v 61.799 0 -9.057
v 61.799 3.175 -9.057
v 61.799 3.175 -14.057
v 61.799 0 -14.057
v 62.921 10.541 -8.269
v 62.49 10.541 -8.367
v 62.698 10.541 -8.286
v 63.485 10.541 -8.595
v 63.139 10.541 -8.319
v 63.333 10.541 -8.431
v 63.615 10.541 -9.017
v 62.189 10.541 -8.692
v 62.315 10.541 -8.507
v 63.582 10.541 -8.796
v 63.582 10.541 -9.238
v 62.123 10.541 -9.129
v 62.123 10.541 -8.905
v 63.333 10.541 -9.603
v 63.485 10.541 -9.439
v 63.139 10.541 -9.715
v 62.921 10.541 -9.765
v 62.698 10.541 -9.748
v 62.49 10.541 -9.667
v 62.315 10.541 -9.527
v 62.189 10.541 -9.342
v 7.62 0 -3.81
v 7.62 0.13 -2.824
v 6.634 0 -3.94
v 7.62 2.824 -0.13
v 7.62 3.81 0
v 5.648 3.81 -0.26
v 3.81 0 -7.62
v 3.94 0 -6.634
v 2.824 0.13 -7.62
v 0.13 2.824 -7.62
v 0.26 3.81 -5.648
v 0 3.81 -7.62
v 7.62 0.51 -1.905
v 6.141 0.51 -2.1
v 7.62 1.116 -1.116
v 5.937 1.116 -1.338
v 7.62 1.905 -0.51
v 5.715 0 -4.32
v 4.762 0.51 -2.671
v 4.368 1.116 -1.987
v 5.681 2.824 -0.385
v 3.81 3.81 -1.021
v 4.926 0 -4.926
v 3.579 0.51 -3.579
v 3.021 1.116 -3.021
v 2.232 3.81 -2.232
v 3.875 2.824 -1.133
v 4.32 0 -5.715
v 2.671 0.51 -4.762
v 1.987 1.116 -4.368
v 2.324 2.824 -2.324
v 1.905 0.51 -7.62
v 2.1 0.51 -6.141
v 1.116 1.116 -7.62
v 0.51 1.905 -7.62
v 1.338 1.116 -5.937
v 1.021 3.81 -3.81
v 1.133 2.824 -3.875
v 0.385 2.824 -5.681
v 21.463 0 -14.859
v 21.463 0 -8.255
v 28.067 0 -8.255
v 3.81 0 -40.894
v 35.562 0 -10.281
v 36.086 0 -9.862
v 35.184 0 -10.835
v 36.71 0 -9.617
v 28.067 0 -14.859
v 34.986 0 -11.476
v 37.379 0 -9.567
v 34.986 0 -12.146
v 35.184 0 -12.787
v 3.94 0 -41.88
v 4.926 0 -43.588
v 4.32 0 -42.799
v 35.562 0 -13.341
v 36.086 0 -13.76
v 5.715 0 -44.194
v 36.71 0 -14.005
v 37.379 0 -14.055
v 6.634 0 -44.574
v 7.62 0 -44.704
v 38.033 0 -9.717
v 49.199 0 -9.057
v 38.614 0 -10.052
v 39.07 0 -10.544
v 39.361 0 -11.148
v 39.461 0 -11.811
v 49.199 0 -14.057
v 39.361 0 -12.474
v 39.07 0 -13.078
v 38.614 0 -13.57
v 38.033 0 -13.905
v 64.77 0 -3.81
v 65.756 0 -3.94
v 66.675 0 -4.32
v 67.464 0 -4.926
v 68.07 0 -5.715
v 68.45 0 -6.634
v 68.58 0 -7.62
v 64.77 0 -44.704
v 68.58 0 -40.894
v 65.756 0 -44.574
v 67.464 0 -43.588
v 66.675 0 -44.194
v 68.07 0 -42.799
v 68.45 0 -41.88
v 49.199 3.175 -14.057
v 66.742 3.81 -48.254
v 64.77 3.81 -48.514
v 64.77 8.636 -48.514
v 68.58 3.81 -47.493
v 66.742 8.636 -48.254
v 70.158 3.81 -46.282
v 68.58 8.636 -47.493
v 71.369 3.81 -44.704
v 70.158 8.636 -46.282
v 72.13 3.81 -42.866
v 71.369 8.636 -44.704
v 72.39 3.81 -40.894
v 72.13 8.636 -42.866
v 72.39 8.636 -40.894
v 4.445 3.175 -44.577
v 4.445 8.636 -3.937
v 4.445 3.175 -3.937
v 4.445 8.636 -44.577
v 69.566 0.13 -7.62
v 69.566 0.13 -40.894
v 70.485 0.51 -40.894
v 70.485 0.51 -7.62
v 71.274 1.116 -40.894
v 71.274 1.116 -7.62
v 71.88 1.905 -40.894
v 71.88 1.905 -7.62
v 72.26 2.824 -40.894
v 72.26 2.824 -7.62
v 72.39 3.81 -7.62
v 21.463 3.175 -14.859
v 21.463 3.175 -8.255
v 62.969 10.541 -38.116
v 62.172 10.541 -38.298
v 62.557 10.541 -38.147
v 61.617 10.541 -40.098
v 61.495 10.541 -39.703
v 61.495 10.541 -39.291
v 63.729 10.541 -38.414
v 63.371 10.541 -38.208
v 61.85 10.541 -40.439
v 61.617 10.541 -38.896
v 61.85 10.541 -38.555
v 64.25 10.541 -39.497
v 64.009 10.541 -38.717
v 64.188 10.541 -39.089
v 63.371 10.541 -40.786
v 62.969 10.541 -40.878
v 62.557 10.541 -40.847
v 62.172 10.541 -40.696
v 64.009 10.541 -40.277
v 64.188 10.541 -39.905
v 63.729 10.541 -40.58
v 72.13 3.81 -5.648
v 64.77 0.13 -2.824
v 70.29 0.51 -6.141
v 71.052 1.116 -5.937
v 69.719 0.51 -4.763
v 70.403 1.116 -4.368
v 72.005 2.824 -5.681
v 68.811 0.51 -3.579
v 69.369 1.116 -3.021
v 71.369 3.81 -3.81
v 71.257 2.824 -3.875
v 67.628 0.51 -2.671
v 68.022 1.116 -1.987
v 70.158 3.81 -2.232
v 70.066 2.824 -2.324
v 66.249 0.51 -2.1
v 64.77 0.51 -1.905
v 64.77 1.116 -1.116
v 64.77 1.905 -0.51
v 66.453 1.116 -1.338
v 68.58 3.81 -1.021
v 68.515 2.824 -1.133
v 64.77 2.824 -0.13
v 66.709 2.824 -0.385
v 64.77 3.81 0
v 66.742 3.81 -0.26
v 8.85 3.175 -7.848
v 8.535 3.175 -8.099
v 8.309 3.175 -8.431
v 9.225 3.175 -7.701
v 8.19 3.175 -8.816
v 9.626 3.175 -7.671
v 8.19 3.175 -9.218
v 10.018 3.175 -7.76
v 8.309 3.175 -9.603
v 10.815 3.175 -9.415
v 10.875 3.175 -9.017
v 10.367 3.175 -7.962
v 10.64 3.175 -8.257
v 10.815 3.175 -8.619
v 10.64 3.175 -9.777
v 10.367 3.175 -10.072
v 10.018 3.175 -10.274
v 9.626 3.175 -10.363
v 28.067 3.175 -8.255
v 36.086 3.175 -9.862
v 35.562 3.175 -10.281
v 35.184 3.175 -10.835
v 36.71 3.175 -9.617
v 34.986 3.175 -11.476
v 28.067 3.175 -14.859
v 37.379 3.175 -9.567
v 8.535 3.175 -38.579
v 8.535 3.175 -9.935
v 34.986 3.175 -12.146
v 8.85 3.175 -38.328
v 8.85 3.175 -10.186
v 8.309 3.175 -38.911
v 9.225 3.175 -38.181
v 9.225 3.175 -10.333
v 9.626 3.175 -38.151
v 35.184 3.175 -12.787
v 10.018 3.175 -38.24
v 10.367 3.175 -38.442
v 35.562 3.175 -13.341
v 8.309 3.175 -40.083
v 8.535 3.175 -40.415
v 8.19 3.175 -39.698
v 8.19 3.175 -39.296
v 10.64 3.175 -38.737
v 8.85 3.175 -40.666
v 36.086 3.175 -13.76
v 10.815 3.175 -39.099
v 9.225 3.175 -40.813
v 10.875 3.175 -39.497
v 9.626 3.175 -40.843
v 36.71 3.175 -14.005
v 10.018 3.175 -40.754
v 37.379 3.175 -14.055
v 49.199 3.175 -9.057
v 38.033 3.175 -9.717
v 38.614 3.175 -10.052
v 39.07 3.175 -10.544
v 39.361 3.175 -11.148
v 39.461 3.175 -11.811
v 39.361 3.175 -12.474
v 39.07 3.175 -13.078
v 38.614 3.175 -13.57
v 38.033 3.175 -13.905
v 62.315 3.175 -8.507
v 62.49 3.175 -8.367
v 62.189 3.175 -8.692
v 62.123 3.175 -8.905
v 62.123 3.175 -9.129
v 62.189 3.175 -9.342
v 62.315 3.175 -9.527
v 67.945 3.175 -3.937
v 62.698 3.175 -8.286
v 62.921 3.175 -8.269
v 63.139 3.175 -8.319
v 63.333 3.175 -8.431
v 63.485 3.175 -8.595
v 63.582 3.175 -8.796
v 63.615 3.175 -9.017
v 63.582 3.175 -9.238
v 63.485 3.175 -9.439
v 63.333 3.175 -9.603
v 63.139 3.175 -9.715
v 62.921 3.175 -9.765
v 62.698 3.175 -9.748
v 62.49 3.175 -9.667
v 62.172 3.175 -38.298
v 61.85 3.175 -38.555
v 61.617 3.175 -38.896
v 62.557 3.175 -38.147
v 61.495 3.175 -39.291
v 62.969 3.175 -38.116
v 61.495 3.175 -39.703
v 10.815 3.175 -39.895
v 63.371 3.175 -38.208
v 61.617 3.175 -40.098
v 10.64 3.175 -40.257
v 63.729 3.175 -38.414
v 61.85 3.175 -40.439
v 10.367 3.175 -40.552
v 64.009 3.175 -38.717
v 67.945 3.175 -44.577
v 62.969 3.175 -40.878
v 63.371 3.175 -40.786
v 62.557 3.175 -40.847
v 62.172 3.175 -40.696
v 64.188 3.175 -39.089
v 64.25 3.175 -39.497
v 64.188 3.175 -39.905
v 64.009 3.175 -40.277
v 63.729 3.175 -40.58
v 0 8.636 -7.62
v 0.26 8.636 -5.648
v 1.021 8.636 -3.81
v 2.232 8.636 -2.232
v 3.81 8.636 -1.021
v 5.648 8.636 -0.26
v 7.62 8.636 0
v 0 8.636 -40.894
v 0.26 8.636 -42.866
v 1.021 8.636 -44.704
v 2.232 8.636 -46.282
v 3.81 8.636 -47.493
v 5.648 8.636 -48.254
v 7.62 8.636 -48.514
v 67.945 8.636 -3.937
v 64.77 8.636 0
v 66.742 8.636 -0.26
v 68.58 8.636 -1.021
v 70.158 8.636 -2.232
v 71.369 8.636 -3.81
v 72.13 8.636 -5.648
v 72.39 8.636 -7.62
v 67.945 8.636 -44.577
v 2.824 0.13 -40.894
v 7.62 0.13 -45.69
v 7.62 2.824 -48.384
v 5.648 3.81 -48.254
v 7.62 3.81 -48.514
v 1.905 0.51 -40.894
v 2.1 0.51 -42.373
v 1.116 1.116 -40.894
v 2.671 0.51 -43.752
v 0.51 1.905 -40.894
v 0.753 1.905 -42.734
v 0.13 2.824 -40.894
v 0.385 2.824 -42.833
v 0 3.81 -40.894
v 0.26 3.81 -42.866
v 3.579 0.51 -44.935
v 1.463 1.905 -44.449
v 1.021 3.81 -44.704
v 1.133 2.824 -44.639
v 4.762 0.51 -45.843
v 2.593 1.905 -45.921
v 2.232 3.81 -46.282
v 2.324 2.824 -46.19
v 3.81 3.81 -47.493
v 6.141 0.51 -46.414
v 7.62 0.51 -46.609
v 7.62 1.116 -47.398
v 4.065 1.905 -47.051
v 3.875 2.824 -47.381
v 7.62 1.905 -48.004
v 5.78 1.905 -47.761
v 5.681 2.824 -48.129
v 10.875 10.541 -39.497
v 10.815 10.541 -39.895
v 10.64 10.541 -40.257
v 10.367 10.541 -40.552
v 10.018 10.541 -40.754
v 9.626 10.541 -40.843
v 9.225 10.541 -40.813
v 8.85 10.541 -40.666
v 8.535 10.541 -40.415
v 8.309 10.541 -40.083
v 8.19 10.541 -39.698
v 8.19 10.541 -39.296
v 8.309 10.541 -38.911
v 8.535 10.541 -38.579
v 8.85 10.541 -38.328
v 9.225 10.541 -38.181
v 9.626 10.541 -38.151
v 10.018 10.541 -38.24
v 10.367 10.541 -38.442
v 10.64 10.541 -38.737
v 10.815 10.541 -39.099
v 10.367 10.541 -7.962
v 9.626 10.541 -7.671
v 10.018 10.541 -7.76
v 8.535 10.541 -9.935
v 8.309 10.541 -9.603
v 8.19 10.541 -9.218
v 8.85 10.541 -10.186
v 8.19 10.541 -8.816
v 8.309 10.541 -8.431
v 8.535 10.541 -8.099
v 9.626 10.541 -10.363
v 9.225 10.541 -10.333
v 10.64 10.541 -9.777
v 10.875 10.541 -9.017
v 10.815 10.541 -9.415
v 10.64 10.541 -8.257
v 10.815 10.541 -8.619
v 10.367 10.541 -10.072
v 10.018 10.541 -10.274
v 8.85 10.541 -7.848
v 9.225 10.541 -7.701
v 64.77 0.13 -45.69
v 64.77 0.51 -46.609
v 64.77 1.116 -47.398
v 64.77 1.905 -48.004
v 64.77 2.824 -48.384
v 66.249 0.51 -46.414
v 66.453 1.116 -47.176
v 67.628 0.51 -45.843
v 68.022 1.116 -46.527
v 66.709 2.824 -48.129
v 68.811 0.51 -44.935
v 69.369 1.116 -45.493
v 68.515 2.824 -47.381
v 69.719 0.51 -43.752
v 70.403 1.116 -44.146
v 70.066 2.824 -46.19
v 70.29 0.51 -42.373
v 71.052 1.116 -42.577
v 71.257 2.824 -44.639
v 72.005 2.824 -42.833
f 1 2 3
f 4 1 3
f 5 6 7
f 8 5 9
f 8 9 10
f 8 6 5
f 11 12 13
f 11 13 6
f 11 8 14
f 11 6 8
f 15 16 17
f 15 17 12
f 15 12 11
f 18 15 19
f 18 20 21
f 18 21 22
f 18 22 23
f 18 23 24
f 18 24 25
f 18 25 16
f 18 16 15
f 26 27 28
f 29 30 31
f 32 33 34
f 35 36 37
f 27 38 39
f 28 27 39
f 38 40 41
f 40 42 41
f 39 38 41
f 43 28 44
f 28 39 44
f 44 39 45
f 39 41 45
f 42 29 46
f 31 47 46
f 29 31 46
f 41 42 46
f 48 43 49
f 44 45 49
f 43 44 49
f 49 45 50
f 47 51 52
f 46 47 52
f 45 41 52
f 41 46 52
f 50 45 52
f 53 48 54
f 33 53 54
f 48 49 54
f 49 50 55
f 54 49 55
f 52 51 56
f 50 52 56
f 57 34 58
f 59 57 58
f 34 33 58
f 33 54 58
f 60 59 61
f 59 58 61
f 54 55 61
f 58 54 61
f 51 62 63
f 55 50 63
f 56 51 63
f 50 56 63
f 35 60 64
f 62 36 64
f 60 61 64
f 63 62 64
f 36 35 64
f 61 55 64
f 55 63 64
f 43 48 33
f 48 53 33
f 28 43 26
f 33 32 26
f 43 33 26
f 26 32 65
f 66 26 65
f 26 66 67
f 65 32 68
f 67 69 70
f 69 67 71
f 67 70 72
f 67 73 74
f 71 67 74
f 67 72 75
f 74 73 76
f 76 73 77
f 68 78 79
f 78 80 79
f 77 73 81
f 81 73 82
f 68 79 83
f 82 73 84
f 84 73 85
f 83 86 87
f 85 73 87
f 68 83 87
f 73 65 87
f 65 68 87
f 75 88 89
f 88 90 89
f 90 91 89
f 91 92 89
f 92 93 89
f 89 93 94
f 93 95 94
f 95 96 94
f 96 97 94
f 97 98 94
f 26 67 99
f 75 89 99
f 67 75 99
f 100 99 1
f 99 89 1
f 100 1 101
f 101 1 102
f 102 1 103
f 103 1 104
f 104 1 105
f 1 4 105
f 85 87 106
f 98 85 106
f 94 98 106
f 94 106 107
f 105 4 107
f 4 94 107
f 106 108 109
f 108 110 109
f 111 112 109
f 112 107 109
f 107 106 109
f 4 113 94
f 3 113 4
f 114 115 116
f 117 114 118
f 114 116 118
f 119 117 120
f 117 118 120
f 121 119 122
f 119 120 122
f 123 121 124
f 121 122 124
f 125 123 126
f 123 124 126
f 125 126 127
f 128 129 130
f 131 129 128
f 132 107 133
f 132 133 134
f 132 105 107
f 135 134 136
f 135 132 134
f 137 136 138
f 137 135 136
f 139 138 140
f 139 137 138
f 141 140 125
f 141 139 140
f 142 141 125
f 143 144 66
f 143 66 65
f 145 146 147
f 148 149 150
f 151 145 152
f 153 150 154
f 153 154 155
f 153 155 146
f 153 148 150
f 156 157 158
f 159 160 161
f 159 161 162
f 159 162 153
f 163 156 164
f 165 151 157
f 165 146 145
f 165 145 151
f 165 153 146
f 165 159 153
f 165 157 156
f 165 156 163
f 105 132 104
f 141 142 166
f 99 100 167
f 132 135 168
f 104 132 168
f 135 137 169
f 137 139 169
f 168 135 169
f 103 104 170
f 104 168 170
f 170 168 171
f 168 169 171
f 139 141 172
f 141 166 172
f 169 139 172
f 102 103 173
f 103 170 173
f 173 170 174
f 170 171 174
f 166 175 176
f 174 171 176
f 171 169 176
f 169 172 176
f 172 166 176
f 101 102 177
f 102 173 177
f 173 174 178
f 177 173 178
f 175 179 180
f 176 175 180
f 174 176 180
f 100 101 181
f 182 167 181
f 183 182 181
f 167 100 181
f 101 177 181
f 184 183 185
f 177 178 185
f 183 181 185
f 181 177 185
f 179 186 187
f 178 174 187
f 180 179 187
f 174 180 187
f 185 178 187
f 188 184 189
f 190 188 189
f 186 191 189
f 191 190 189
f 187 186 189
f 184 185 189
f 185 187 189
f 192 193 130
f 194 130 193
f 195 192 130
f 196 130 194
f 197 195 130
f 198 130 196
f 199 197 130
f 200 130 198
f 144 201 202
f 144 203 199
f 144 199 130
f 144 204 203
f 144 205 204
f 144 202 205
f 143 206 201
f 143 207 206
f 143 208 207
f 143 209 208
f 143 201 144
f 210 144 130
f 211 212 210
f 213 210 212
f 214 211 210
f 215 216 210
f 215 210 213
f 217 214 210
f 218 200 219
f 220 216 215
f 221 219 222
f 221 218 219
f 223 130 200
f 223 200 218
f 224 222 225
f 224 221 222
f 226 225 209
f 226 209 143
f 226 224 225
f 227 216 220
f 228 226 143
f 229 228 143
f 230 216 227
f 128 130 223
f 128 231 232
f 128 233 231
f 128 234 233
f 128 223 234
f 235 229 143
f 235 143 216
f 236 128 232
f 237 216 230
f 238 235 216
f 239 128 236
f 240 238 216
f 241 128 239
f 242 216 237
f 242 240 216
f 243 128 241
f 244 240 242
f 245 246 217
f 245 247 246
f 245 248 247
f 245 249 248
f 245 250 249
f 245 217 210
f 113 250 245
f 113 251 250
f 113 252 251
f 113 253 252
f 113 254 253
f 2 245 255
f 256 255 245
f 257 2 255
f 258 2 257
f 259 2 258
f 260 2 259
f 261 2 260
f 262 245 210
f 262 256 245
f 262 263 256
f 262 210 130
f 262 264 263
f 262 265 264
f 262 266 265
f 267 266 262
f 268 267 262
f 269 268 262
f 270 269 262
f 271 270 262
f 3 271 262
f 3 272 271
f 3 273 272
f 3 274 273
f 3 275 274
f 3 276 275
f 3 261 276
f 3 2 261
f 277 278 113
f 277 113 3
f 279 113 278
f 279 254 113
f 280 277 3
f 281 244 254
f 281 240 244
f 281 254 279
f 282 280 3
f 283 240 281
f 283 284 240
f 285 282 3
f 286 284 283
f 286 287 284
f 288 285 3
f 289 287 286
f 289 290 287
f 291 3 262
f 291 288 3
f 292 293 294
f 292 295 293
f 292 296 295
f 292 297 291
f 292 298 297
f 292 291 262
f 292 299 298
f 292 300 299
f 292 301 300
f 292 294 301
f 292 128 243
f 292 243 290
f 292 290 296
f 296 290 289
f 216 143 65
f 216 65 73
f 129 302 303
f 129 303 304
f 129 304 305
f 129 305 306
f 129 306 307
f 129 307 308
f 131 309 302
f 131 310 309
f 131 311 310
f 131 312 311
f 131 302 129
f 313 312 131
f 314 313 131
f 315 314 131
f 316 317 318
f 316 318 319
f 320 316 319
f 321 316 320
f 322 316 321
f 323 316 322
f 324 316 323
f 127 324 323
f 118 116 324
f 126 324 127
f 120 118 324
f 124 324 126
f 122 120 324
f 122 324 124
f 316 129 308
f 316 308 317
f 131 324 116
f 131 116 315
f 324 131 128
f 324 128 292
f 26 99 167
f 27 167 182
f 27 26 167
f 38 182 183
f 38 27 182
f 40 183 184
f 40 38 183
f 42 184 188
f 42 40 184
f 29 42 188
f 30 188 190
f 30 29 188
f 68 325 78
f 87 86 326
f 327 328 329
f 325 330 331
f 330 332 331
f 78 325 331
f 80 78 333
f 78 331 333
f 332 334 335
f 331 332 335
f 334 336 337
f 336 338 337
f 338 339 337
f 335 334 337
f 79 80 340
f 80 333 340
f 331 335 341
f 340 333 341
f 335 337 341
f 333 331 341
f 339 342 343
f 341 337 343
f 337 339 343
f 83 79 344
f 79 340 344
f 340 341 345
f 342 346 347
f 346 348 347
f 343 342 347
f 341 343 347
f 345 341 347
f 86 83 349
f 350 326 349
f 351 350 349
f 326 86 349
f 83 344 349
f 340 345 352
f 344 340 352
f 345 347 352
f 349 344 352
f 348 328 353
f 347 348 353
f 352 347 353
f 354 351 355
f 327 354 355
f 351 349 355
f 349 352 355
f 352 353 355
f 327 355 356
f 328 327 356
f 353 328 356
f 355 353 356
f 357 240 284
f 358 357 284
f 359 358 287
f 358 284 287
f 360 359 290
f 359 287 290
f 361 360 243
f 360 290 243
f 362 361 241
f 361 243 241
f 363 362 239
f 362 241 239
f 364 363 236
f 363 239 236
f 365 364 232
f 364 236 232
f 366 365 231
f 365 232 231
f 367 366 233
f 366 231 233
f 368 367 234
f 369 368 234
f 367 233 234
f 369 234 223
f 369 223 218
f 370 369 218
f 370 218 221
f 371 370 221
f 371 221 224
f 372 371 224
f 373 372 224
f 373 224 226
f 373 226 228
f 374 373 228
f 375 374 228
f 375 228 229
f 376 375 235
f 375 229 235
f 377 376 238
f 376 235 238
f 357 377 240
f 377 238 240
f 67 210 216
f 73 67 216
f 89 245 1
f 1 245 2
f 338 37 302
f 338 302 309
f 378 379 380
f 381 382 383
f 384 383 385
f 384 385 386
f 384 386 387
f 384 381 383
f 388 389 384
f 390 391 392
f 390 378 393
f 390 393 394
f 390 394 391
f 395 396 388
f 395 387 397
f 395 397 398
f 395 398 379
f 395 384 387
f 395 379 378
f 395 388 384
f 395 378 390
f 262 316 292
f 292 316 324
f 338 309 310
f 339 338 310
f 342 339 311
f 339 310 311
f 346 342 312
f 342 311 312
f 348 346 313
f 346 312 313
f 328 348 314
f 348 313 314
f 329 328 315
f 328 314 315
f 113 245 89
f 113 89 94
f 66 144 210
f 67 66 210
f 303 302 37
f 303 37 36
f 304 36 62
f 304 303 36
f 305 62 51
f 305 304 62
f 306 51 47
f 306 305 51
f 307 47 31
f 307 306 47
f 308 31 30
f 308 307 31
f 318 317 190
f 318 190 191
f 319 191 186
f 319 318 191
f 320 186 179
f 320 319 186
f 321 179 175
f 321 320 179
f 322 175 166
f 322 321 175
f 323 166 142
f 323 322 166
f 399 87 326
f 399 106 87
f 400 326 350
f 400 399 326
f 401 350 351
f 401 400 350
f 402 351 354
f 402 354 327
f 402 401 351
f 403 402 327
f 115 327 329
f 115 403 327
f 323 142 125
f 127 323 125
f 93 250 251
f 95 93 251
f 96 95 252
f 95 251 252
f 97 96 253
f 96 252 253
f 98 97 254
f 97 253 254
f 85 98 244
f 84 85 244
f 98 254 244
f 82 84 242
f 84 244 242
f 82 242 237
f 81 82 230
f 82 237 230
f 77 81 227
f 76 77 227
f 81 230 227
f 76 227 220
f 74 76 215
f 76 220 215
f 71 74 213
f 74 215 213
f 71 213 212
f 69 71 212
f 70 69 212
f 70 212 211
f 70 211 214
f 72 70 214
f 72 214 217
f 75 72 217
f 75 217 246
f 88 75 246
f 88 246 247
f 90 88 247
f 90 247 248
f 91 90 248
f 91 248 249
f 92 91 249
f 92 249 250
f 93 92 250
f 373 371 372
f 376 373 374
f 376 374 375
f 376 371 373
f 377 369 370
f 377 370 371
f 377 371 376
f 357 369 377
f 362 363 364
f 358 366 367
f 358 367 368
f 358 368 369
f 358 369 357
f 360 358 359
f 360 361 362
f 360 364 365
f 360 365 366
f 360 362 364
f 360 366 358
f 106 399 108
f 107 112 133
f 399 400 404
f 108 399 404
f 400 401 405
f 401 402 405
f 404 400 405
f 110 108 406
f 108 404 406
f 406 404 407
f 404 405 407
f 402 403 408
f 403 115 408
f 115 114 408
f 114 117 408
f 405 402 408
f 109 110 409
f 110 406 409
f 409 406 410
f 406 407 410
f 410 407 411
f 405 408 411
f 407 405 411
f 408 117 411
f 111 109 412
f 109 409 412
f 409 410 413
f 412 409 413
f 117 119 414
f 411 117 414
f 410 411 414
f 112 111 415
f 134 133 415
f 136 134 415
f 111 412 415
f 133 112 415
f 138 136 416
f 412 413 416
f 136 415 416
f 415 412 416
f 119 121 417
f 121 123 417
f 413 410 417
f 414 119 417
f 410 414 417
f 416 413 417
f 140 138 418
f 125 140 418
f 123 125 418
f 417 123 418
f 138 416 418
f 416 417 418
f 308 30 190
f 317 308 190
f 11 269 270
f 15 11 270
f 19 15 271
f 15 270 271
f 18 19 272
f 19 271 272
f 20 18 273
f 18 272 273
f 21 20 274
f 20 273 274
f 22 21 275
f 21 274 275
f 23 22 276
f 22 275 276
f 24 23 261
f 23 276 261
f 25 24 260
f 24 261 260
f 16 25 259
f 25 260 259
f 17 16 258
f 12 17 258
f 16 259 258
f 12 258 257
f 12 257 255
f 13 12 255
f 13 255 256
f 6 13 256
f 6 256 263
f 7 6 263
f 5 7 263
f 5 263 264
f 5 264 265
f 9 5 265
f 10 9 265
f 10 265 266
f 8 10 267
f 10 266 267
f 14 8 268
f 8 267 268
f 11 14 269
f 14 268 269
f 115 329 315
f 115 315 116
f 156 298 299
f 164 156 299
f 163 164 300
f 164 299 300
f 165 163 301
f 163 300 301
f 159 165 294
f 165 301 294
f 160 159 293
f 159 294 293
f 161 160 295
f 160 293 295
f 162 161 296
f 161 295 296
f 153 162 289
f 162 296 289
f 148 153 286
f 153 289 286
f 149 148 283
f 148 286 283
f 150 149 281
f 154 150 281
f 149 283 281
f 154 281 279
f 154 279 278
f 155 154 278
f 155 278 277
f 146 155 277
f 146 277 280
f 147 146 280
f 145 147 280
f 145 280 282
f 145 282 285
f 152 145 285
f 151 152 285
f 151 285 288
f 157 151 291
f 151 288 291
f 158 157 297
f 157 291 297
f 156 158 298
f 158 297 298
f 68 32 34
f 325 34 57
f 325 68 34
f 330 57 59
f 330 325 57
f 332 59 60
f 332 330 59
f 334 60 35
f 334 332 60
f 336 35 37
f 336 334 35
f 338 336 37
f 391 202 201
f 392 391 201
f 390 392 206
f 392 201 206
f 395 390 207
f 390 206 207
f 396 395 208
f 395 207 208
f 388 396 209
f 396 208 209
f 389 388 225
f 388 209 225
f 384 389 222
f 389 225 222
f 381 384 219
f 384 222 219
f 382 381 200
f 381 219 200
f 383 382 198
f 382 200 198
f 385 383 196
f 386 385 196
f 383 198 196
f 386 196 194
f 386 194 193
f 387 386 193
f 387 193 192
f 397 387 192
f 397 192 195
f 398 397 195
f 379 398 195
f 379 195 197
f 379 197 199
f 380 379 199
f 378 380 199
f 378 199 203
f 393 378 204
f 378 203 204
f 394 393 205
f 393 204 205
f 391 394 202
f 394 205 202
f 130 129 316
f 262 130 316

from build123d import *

# Parameters (mm, degrees)
SKETCH1_W           = 72.39
SKETCH1_H           = 48.514
BOSS_EXTRUDE1_DEPTH = 8.636
SKETCH2_W           = 63.5
SKETCH2_H           = 40.64
CUT_EXTRUDE1_DEPTH  = 5.461
FILLET2_R           = 7.62
FILLET3_R           = 3.81
SKETCH4_R           = 2.25
SKETCH4_W           = 12.6
SKETCH4_H           = 5
SKETCH4_W_2         = 6.604
SKETCH4_H_2         = 6.604
CUT_EXTRUDE2_DEPTH  = 7.366
SKETCH5_R           = 1.35
SKETCH5_R_2         = 1.3499973
SKETCH5_R_3         = 1.385
SKETCH5_R_4         = 0.75
BOSS_EXTRUDE2_DEPTH = 7.366


with BuildPart() as part:
    # Sketch1 → Boss-Extrude1 (new body)
    with BuildSketch(Plane(origin=(0, 0, 0), x_dir=(1, 0, 0), z_dir=(0, 1, 0))):
        with Locations((36.195, 24.257)):
            Rectangle(SKETCH1_W, SKETCH1_H)
    extrude(amount=BOSS_EXTRUDE1_DEPTH)

    # Sketch2 → Cut-Extrude1 (cut)
    with BuildSketch(Plane(origin=(0, 8.636, 0), x_dir=(1, 0, 0), z_dir=(0, 1, 0))):
        with Locations((36.195, 24.257)):
            Rectangle(SKETCH2_W, SKETCH2_H)
    extrude(amount=-CUT_EXTRUDE1_DEPTH, mode=Mode.SUBTRACT)

    # Fillet2
    fillet2_edges = [part.edges().sort_by_distance(p)[0] for p in [
        (0, 4.318, -48.514),
        (72.39, 4.318, -48.514),
        (72.39, 4.318, 0),
        (0, 4.318, 0),
    ]]
    fillet(fillet2_edges, radius=FILLET2_R)

    # Fillet3
    fillet3_edges = [part.edges().sort_by_distance(p)[0] for p in [
        (36.195, 0, -48.514),
        (0, 0, -24.257),
        (72.39, 0, -24.257),
        (36.195, 0, 0),
        (2.231846327, 0, -46.282153673),
        (2.231846327, 0, -2.231846327),
        (70.158153673, 0, -2.231846327),
        (70.158153673, 0, -46.282153673),
    ]]
    fillet(fillet3_edges, radius=FILLET3_R)

    # Sketch4 → Cut-Extrude2 (cut)
    with BuildSketch(Plane(origin=(0, 3.175, 0), x_dir=(1, 0, 0), z_dir=(0, 1, 0))):
        with Locations((37.211, 11.811)):
            Circle(SKETCH4_R)
        with Locations((55.499, 11.557)):
            Rectangle(SKETCH4_W, SKETCH4_H)
        with Locations((24.765, 11.557)):
            Rectangle(SKETCH4_W_2, SKETCH4_H_2)
    extrude(amount=-CUT_EXTRUDE2_DEPTH, mode=Mode.SUBTRACT)

    # Sketch5 → Boss-Extrude2 (add)
    with BuildSketch(Plane(origin=(0, 3.175, 0), x_dir=(1, 0, 0), z_dir=(0, 1, 0))):
        with Locations((9.525, 39.497)):
            Circle(SKETCH5_R)
        with Locations((9.525, 9.017)):
            Circle(SKETCH5_R_2)
        with Locations((62.865, 39.497)):
            Circle(SKETCH5_R_3)
        with Locations((62.865, 9.017)):
            Circle(SKETCH5_R_4)
    extrude(amount=BOSS_EXTRUDE2_DEPTH)


solid = part.part
